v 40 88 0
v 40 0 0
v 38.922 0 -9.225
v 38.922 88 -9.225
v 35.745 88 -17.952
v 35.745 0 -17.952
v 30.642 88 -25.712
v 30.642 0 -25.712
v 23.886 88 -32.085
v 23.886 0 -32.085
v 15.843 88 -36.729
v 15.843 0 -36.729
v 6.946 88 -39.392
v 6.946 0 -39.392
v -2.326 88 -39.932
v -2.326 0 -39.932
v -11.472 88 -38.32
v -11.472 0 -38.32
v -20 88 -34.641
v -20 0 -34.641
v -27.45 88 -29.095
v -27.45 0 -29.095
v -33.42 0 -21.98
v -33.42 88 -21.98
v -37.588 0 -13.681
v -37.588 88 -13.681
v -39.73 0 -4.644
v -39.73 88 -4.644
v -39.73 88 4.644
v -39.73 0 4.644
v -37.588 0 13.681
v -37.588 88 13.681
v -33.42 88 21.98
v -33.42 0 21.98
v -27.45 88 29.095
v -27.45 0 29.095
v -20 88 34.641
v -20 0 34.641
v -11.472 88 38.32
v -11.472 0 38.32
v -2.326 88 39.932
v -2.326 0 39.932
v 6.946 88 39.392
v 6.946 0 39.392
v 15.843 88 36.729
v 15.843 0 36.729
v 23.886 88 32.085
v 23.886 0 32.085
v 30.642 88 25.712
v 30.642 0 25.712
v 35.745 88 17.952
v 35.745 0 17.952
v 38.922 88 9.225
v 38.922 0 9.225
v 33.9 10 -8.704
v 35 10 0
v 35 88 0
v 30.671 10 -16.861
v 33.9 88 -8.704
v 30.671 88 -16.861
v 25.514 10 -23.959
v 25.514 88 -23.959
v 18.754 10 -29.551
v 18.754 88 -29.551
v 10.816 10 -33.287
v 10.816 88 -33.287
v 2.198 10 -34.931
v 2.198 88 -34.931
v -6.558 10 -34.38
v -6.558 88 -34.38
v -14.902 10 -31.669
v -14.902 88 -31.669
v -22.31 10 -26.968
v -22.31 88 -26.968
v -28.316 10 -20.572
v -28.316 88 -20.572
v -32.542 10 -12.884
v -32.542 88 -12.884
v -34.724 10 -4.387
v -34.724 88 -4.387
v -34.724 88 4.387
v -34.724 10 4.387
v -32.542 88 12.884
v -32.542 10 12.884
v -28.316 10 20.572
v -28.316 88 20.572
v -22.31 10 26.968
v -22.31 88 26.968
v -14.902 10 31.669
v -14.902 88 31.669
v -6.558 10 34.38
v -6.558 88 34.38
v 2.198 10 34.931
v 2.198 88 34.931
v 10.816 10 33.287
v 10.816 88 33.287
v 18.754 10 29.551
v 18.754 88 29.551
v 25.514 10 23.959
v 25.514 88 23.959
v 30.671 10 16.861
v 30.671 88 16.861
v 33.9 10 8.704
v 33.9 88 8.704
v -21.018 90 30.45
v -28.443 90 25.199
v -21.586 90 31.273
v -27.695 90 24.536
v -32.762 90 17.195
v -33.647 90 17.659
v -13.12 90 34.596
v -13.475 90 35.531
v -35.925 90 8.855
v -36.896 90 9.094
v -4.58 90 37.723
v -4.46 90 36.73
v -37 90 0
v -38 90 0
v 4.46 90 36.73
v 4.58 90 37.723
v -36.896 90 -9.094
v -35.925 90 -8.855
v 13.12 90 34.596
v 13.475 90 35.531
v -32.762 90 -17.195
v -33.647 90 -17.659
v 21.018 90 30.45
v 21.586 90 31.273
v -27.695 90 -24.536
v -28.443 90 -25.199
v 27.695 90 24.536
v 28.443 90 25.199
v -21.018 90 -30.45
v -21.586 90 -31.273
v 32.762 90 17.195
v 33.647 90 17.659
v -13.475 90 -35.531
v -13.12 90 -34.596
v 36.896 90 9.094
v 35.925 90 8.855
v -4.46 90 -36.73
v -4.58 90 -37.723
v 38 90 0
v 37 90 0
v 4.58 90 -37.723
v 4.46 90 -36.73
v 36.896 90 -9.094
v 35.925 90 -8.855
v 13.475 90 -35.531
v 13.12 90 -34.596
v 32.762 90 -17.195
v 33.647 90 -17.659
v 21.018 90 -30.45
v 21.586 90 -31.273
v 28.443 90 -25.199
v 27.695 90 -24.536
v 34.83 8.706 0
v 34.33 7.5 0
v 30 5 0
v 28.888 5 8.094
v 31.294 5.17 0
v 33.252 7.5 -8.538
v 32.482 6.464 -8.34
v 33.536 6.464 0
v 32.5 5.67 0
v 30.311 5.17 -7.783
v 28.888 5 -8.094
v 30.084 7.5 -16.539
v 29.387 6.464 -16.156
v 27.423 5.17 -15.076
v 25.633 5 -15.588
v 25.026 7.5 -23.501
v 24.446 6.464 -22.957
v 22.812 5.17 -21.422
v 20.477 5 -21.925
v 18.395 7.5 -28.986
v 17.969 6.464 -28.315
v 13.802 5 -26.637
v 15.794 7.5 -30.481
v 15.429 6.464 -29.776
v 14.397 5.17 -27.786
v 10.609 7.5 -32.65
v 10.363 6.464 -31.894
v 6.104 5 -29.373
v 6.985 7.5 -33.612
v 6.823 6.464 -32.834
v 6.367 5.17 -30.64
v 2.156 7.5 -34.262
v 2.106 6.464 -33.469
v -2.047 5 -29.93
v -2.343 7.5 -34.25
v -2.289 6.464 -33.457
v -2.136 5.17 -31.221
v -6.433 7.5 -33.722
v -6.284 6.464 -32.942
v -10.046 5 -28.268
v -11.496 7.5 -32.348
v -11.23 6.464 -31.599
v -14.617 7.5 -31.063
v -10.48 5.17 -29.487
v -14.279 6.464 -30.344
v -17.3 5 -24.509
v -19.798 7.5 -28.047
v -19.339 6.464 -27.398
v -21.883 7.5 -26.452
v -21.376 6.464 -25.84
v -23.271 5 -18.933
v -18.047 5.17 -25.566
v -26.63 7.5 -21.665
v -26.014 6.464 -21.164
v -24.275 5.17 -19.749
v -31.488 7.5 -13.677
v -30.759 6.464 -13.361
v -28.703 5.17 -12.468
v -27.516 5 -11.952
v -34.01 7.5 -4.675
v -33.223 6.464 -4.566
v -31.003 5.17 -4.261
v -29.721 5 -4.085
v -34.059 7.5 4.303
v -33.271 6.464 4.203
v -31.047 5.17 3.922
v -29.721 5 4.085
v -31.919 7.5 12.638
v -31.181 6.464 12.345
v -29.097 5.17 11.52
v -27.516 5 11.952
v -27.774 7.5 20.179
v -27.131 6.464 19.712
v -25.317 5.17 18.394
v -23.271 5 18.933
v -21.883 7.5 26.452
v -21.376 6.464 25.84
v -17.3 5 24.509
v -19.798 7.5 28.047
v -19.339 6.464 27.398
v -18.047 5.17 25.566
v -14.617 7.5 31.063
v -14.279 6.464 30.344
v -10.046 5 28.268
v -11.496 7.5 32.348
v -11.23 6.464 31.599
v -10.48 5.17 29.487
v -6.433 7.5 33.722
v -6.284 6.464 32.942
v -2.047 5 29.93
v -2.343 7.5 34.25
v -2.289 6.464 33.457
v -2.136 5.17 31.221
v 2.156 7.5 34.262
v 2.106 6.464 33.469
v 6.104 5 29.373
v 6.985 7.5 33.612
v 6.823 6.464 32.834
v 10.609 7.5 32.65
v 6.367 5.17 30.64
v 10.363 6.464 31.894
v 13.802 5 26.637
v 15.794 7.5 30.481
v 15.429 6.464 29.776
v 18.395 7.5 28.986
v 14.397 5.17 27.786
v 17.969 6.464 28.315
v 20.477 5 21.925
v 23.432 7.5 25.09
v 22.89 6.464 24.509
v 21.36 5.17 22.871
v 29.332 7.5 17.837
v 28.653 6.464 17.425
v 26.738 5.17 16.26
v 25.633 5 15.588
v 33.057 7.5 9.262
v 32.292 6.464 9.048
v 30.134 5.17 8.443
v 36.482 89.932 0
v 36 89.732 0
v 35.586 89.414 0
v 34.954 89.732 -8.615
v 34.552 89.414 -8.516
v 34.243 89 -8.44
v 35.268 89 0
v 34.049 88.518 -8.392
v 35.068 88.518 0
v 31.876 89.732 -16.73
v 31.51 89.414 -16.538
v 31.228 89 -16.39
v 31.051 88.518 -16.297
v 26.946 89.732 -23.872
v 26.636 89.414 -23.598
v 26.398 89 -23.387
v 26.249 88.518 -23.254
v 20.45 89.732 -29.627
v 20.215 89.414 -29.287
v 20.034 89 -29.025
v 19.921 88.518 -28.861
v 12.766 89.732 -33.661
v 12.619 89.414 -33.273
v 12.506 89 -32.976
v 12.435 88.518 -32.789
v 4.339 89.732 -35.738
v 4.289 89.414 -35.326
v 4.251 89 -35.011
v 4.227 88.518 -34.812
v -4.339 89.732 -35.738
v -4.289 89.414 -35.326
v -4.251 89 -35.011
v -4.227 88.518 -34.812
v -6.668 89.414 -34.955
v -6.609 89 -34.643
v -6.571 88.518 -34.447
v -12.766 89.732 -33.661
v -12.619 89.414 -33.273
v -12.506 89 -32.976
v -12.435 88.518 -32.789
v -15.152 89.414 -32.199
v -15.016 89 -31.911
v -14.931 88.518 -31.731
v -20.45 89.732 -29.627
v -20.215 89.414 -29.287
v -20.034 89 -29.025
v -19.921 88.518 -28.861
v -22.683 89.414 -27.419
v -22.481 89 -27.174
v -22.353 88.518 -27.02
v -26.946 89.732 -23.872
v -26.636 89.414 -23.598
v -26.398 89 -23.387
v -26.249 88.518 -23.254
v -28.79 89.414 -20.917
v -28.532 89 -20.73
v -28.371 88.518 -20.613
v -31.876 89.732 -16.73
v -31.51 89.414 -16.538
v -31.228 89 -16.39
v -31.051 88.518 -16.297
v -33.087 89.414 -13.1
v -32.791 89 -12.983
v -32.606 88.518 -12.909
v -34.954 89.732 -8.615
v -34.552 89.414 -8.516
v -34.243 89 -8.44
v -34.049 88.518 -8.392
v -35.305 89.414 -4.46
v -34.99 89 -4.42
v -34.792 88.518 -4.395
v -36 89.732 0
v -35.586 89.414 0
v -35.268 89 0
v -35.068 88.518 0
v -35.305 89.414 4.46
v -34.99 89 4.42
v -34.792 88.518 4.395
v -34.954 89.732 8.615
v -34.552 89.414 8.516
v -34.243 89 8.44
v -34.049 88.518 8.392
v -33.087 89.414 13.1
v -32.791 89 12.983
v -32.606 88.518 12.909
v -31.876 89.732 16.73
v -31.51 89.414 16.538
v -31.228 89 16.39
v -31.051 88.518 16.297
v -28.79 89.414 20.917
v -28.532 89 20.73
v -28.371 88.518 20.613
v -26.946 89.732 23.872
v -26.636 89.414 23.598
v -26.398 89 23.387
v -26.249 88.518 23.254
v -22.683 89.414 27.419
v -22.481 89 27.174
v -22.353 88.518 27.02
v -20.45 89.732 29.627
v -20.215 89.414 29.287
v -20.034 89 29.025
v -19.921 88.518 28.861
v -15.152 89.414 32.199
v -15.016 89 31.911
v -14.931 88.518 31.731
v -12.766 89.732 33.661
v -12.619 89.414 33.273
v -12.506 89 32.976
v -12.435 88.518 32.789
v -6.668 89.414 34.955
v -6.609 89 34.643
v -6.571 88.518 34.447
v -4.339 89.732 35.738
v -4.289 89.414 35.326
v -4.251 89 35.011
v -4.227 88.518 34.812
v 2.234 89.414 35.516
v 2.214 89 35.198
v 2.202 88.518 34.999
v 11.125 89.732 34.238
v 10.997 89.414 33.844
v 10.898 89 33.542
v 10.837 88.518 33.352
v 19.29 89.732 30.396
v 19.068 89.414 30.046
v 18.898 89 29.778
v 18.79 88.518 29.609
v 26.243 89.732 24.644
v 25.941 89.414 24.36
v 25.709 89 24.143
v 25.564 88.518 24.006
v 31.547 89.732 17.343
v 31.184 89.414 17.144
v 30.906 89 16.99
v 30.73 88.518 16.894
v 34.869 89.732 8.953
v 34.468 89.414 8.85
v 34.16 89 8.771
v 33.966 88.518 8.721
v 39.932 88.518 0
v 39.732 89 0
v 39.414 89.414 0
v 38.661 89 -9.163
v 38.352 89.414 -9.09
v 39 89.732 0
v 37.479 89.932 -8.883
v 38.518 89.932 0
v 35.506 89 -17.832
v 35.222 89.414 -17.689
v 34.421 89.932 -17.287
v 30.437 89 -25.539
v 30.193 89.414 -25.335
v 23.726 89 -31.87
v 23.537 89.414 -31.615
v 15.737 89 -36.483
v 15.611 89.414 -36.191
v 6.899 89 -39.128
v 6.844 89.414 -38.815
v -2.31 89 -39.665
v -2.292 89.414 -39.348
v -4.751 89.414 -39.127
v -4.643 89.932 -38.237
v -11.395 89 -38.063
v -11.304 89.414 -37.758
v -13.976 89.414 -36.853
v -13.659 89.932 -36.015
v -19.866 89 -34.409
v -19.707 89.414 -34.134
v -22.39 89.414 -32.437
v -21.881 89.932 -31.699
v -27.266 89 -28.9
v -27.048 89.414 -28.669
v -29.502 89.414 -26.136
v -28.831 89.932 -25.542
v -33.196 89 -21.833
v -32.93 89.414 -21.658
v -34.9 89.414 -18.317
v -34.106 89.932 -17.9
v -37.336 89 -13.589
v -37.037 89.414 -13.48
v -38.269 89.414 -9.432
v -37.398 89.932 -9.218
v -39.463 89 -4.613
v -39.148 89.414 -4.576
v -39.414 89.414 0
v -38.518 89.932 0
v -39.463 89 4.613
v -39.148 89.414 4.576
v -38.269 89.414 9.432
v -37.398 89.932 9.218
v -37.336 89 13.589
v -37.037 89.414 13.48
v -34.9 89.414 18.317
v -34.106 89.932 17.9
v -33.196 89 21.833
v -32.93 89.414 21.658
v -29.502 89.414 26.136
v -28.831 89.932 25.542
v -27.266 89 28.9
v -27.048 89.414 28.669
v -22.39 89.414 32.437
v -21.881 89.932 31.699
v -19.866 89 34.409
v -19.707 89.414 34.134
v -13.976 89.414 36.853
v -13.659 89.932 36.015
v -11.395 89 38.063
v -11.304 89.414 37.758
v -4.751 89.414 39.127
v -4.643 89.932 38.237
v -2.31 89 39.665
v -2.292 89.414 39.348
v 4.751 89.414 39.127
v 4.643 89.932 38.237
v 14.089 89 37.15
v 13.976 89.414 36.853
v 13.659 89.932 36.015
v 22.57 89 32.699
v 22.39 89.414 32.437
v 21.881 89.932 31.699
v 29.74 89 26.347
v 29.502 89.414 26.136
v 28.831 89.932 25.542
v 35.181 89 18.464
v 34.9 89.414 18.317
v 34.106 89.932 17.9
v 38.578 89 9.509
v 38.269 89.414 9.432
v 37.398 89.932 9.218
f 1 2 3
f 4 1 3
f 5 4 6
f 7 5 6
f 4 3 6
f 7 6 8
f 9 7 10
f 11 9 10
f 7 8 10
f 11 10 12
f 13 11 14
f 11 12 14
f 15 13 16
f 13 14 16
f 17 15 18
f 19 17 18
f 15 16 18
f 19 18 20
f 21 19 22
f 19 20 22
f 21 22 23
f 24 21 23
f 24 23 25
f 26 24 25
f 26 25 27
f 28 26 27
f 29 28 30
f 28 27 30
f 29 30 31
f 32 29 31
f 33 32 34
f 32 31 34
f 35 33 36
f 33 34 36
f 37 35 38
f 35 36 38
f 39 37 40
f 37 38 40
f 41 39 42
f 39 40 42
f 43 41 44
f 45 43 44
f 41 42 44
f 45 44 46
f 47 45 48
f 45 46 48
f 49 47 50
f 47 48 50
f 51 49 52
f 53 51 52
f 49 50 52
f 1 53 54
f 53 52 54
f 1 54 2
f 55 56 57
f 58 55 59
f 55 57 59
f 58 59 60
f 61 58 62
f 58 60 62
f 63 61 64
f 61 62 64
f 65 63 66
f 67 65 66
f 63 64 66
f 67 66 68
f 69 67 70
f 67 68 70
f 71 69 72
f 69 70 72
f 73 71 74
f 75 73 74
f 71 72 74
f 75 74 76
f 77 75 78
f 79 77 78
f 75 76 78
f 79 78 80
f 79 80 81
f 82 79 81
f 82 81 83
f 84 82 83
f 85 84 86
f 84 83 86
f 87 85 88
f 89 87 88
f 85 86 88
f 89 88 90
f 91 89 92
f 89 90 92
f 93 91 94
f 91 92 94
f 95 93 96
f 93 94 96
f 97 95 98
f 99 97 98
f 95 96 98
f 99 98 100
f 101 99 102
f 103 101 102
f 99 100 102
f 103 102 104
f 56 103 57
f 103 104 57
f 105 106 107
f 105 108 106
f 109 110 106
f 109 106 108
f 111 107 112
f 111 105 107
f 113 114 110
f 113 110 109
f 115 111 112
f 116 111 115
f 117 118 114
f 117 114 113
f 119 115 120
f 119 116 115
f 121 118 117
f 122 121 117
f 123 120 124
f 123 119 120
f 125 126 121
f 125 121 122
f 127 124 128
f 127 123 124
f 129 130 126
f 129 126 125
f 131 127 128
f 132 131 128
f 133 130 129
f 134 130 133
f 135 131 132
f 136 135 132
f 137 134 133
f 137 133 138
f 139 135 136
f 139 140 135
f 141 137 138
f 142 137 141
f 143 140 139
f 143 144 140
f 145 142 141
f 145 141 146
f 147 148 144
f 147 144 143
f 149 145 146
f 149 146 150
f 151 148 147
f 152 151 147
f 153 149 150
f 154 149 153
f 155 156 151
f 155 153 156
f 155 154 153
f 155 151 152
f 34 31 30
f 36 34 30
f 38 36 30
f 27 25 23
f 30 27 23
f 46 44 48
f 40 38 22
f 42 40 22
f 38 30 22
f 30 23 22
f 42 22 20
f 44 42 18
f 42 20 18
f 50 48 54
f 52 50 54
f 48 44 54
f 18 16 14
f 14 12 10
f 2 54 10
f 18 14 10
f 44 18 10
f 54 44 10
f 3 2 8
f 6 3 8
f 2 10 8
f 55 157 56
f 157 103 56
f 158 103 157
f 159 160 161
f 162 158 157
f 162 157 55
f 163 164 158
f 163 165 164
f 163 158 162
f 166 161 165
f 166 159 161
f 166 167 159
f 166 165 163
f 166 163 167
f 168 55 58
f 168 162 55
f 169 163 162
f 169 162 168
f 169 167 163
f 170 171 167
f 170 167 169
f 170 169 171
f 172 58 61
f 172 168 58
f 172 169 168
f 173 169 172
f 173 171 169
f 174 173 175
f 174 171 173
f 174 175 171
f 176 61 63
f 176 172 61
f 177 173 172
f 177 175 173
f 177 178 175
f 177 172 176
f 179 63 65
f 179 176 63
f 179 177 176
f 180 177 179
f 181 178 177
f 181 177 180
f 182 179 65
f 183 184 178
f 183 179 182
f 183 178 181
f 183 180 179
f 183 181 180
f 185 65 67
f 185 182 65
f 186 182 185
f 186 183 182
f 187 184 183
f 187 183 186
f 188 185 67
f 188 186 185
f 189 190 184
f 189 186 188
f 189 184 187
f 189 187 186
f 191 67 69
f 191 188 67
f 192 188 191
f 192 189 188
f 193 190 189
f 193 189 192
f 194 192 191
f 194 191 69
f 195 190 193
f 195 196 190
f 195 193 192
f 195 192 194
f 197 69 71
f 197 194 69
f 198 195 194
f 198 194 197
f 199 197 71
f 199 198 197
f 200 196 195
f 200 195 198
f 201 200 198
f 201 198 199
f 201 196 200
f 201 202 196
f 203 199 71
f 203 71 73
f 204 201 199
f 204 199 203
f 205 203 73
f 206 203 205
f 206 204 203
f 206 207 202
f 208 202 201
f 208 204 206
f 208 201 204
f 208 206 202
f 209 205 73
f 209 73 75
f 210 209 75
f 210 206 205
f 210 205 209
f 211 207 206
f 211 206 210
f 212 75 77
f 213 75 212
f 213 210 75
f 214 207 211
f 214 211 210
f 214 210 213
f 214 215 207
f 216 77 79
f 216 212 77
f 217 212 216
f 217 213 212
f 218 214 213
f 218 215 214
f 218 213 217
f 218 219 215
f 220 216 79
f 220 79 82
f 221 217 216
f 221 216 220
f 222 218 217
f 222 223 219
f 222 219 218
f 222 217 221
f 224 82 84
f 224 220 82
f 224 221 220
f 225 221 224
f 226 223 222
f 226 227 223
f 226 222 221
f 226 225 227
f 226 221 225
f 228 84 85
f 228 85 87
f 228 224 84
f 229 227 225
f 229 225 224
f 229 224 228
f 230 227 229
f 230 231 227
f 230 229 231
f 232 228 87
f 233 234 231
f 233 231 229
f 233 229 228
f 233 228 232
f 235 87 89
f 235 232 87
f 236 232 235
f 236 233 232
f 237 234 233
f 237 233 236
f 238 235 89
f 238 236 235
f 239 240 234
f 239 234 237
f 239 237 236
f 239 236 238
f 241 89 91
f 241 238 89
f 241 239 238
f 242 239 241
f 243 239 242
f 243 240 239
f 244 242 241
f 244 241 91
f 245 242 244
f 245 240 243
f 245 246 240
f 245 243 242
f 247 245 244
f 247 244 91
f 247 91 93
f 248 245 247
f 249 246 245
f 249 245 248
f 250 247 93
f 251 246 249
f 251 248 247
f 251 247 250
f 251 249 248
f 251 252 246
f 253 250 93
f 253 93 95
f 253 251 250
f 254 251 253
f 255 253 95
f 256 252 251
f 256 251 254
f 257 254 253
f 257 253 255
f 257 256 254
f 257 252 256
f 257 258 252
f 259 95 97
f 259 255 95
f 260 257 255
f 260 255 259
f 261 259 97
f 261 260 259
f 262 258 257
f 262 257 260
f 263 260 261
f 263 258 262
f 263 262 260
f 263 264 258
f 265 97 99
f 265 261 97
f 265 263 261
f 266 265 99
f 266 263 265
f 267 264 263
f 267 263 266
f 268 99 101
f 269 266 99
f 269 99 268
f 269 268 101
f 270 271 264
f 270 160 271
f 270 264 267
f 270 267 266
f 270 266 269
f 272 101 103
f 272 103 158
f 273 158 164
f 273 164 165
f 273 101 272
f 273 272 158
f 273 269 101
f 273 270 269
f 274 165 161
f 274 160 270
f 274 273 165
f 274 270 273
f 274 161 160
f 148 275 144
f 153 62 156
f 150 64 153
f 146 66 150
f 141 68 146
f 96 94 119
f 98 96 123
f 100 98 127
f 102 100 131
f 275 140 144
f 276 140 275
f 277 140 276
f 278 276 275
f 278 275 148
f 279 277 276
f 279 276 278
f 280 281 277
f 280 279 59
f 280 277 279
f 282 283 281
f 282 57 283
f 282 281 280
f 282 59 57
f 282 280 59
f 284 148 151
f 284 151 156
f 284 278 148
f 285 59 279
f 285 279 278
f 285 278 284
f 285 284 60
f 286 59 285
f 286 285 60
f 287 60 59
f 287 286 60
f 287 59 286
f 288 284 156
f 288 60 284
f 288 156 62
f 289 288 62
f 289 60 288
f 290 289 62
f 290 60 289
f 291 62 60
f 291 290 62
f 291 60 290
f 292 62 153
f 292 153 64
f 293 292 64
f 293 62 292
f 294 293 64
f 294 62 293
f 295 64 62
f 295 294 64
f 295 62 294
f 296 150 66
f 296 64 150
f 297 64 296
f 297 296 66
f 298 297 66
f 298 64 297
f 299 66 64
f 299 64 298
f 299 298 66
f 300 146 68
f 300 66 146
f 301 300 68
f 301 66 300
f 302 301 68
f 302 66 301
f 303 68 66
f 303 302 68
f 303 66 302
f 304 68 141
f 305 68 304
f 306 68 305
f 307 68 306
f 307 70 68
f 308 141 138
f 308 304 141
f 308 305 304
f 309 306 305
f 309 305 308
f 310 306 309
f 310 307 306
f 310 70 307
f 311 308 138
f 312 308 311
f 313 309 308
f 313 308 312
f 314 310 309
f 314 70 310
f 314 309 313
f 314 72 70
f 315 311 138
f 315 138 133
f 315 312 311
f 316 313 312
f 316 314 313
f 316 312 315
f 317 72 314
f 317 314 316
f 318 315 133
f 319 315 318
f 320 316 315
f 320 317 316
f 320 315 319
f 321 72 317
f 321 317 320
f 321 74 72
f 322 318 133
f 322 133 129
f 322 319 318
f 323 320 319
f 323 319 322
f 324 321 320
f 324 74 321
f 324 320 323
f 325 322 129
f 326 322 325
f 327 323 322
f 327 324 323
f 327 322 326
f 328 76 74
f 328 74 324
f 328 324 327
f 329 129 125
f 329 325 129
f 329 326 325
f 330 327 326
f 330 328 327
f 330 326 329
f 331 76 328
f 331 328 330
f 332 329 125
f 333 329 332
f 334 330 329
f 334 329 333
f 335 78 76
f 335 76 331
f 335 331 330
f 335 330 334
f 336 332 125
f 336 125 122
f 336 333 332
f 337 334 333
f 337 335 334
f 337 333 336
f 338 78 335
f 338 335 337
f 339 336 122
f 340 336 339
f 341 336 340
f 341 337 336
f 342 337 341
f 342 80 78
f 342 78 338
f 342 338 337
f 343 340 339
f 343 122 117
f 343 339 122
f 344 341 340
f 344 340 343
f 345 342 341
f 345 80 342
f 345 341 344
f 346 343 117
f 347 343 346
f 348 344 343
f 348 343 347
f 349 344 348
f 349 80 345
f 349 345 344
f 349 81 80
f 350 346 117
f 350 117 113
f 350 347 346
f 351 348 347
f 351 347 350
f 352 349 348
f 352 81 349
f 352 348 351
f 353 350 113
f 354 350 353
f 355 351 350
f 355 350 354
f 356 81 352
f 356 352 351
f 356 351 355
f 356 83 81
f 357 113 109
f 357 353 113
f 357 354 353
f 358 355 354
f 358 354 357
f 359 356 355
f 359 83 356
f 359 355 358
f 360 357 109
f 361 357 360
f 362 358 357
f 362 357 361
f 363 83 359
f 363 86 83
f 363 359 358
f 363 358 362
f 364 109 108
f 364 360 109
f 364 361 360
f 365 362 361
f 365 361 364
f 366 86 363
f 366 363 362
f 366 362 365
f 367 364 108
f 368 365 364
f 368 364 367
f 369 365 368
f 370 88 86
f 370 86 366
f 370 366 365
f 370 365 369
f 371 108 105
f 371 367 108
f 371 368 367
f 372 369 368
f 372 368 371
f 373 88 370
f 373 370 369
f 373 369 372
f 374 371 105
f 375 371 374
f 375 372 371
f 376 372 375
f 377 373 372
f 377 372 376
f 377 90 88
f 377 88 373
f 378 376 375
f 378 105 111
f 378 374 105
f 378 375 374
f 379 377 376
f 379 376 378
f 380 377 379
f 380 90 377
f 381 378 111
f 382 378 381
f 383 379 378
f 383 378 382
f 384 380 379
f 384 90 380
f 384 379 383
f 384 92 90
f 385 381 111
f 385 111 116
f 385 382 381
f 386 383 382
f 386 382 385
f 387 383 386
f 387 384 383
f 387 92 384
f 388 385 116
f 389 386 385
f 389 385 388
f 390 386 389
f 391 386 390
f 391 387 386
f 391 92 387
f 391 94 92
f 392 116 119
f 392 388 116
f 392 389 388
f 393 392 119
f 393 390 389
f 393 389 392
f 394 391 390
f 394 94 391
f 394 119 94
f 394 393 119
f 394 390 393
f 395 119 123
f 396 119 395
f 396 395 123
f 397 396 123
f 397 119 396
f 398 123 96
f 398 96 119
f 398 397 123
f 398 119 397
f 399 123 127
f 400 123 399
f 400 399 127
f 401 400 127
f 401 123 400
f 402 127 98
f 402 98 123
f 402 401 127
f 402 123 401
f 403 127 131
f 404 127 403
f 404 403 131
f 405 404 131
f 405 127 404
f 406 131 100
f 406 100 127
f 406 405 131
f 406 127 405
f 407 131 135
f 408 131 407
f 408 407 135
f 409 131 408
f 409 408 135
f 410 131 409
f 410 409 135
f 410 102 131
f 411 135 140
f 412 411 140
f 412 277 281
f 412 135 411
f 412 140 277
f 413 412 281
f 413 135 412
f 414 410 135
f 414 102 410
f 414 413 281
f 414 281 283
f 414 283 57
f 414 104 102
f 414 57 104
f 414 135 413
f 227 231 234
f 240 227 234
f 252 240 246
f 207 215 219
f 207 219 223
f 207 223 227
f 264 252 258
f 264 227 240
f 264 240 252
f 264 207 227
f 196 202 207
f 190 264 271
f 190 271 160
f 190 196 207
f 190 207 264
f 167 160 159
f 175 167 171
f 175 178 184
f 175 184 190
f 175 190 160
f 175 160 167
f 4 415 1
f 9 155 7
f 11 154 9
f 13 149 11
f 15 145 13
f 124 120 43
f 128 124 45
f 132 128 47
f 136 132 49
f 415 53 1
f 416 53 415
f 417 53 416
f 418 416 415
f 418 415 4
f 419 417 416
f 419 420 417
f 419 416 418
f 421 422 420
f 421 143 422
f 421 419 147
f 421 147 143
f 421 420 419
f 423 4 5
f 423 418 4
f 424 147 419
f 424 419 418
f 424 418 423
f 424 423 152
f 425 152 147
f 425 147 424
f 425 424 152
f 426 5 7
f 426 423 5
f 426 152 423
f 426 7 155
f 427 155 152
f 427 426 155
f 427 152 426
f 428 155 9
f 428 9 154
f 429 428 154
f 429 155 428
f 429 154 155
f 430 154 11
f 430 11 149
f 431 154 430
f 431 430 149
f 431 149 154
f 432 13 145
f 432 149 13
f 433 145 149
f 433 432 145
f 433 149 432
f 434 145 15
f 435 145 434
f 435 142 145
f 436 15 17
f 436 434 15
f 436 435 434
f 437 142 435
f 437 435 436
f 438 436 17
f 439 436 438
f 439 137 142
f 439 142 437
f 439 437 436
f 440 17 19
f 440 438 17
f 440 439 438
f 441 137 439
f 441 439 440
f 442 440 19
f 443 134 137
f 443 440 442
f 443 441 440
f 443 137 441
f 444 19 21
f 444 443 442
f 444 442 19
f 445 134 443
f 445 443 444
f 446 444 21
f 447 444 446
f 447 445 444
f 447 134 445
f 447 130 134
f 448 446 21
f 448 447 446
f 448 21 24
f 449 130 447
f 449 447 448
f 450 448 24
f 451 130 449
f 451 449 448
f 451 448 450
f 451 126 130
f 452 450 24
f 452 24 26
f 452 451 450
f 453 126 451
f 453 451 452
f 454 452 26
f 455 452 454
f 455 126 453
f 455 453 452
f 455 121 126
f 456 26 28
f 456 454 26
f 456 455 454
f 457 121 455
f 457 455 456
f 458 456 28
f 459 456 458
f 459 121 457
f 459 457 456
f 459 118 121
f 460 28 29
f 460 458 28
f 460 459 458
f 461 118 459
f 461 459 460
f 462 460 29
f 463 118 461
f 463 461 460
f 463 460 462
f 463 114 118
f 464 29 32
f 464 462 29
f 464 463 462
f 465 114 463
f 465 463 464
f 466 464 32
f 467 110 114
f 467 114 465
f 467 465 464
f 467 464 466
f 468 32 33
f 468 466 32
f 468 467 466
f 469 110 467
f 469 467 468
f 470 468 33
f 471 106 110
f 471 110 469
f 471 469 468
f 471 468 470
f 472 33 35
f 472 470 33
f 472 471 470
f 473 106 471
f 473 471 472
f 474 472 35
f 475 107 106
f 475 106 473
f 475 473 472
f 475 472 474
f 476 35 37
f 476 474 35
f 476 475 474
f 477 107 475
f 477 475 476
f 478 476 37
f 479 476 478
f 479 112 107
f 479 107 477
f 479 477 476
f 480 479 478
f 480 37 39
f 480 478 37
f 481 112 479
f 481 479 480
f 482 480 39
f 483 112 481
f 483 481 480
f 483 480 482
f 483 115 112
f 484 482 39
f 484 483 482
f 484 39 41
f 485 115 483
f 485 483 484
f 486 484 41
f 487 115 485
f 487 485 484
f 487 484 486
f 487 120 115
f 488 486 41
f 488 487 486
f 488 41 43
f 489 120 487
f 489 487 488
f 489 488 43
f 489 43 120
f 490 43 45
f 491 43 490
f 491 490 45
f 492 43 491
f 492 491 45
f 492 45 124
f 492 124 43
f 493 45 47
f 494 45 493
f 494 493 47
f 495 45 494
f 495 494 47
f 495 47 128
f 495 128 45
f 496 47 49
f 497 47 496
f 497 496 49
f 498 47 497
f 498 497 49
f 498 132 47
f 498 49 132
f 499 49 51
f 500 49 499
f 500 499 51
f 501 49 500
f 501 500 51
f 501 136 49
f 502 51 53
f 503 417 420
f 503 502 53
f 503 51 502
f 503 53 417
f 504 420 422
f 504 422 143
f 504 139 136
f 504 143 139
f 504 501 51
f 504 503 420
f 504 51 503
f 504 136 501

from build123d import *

# Parameters (mm, degrees)
SKETCH1_R           = 40
BOSS_EXTRUDE1_DEPTH = 90
SKETCH2_R           = 35
CUT_EXTRUDE1_DEPTH  = 85
FILLET1_R           = 2
FILLET2_R           = 2
FILLET4_R           = 5


with BuildPart() as part:
    # Sketch1 → Boss-Extrude1 (new body)
    with BuildSketch(Plane(origin=(0, 0, 0), x_dir=(1, 0, 0), z_dir=(0, 1, 0))):
        Circle(SKETCH1_R)
    extrude(amount=BOSS_EXTRUDE1_DEPTH)

    # Sketch2 → Cut-Extrude1 (cut)
    with BuildSketch(Plane(origin=(0, 90, 0), x_dir=(1, 0, 0), z_dir=(0, 1, 0))):
        Circle(SKETCH2_R)
    extrude(amount=-CUT_EXTRUDE1_DEPTH, mode=Mode.SUBTRACT)

    # Fillet1
    fillet1_edges = [part.edges().sort_by_distance(p)[0] for p in [
        (-40, 90, 0),
    ]]
    fillet(fillet1_edges, radius=FILLET1_R)

    # Fillet2
    fillet2_edges = [part.edges().sort_by_distance(p)[0] for p in [
        (-35, 90, 0),
    ]]
    fillet(fillet2_edges, radius=FILLET2_R)

    # Fillet4
    fillet4_edges = [part.edges().sort_by_distance(p)[0] for p in [
        (-35, 5, 0),
    ]]
    fillet(fillet4_edges, radius=FILLET4_R)


solid = part.part
